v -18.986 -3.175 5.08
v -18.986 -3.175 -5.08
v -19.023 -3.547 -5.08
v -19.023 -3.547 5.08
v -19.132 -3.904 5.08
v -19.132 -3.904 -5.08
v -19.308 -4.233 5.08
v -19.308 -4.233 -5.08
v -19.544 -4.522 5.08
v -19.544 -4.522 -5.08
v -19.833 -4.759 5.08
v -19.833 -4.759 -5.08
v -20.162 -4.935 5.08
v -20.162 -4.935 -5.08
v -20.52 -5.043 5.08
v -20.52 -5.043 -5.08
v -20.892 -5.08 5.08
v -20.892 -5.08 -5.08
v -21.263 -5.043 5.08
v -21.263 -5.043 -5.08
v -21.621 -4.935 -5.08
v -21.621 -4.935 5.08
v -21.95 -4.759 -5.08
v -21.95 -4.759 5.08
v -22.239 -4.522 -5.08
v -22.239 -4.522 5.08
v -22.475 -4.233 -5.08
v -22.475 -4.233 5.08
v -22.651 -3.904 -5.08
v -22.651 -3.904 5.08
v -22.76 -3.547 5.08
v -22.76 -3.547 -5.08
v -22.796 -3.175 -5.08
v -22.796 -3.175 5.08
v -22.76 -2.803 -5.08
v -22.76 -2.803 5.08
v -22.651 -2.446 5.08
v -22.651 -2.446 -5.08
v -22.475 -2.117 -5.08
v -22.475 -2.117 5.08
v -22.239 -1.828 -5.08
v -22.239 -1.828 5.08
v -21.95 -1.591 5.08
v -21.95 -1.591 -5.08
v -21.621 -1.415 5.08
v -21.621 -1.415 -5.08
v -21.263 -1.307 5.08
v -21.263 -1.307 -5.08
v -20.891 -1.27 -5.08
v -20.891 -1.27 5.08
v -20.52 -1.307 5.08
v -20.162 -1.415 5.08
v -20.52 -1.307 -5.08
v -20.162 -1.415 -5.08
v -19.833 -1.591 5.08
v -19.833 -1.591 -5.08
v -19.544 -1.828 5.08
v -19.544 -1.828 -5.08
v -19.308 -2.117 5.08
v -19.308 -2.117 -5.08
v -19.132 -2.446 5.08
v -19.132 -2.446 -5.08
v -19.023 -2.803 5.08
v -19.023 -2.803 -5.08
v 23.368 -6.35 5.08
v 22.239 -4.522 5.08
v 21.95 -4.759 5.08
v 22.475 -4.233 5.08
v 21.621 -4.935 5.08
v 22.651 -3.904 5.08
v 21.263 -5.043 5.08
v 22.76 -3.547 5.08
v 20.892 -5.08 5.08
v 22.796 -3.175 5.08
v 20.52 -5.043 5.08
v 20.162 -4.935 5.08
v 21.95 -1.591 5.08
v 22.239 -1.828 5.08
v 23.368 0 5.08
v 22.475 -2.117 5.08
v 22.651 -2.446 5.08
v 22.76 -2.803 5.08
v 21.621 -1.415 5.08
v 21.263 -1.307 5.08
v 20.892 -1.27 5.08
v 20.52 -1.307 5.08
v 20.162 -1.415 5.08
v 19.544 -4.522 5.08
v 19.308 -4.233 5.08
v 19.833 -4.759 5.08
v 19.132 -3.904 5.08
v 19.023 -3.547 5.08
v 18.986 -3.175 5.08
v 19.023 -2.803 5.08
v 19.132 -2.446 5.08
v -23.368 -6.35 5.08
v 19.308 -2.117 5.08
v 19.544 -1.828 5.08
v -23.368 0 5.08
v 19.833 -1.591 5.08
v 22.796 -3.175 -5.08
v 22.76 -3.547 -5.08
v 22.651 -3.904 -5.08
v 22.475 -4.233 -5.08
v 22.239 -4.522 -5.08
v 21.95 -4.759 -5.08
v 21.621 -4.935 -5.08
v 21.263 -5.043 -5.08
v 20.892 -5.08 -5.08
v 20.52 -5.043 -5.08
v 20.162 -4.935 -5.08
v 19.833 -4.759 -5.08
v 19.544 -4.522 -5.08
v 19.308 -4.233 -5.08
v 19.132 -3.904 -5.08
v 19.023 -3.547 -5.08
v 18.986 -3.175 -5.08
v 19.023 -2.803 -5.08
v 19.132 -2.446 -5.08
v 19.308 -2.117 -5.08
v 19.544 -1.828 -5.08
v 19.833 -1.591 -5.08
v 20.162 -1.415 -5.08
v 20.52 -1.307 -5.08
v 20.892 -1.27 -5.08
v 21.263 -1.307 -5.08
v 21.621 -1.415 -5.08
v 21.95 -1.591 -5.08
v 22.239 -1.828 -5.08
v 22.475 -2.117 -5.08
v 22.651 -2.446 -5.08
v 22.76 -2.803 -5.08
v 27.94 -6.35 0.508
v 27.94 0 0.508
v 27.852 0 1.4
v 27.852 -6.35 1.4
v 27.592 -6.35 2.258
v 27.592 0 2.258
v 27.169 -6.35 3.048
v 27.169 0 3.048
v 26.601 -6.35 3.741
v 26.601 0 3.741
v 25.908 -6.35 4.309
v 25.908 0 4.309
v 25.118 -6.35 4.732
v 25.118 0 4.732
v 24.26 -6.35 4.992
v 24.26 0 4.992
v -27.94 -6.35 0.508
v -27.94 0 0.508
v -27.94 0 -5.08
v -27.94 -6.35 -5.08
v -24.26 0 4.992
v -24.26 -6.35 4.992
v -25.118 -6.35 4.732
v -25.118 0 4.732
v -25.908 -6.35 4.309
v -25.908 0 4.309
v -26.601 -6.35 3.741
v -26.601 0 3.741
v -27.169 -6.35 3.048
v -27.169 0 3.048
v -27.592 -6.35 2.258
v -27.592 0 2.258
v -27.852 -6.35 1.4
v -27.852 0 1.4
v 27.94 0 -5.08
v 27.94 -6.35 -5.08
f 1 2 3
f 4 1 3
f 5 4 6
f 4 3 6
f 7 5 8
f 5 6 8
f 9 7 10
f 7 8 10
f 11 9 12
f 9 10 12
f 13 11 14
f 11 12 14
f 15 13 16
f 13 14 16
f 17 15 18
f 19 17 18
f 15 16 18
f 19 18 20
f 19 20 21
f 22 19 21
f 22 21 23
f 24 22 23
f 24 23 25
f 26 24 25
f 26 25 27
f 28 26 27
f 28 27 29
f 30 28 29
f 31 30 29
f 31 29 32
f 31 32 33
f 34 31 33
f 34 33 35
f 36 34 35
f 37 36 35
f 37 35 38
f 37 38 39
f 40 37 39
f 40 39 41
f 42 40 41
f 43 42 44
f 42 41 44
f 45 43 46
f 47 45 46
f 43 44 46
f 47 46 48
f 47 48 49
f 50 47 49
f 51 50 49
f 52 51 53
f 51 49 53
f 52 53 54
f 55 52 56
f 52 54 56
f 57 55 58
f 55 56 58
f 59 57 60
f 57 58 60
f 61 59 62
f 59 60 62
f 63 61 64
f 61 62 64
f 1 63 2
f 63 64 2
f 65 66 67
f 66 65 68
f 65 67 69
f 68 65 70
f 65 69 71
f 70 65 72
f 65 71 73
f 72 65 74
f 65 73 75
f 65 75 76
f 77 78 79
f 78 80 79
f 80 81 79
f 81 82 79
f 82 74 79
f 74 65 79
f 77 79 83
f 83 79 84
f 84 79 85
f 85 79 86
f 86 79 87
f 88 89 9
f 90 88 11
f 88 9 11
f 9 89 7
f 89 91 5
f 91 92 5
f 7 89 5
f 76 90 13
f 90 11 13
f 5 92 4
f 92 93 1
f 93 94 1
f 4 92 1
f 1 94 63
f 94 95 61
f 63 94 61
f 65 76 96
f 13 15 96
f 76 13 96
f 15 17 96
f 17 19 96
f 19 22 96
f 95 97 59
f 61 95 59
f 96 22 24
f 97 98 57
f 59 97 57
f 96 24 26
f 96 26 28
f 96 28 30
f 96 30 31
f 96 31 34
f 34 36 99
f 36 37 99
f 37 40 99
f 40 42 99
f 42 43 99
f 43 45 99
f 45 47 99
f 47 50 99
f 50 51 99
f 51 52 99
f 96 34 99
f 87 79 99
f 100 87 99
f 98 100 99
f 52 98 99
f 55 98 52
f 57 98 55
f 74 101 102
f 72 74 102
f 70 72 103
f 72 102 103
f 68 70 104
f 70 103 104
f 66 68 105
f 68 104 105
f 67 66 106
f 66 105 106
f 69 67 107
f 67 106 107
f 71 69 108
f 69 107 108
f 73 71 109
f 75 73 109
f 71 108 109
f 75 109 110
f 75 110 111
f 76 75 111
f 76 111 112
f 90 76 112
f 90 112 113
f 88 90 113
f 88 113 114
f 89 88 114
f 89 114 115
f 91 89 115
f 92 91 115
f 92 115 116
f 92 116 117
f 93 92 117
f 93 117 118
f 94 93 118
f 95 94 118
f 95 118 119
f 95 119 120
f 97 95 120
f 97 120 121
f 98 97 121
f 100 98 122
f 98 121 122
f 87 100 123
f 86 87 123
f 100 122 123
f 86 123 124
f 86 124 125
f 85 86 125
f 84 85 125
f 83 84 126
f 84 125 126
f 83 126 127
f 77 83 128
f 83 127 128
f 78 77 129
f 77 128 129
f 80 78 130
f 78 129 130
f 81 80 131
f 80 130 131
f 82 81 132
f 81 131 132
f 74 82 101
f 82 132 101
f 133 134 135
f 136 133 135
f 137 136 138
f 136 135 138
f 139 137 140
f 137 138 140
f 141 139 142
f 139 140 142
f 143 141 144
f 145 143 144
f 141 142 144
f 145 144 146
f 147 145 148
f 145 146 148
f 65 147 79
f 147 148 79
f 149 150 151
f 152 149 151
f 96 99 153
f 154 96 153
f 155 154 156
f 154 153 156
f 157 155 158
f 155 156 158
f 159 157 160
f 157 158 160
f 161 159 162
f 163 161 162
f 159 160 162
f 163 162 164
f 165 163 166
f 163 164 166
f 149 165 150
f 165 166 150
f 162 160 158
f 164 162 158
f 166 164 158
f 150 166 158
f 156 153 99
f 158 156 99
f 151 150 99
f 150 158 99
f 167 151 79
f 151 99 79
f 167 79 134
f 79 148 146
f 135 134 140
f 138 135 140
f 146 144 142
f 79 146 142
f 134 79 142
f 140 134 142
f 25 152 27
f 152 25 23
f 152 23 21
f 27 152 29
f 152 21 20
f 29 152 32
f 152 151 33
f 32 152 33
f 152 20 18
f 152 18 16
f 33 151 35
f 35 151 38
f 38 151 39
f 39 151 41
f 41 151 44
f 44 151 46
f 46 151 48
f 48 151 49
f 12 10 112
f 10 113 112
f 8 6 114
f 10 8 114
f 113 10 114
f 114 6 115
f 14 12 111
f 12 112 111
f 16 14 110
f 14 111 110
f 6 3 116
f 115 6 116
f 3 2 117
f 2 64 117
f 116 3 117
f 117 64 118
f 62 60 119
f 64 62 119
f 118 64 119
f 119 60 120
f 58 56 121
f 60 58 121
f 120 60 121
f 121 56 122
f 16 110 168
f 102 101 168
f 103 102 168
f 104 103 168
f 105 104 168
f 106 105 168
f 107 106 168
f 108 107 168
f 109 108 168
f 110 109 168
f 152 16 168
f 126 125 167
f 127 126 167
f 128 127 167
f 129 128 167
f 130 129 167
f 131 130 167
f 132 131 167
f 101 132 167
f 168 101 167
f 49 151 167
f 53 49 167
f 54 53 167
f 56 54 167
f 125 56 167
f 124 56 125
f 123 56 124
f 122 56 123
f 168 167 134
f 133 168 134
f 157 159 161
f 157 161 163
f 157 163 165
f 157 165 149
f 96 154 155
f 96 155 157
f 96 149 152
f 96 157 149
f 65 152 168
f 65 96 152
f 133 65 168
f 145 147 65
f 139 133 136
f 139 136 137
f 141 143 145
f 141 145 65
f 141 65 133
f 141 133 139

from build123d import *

# Parameters (mm, degrees)
F1_DEPTH = 6.35
F2_R     = 1.905
F3_DEPTH = 25.4


with BuildPart() as f1:
    # F0 (on Front) → F1 (new body)
    with BuildSketch(Plane.XZ):
        with BuildLine():
            ThreePointArc((27.94, 0.508), (26.600892, 3.740892), (23.368, 5.08))
            Line((23.368, 5.08), (-23.368, 5.08))
            ThreePointArc((-23.368, 5.08), (-26.600892, 3.740892), (-27.94, 0.508))
            Line((-27.94, 0.508), (-27.94, -5.08))
            Line((-27.94, -5.08), (27.94, -5.08))
            Line((27.94, -5.08), (27.94, 0.508))
        make_face()
    extrude(amount=F1_DEPTH)

    # F2 (on face) → F3 (cut)
    with BuildSketch(Plane(origin=(0, 0, -5.08), x_dir=(1, 0, 0), z_dir=(0, 0, -1))):
        with Locations((20.8915, 3.175)):
            Circle(F2_R)
        with Locations((-20.8915, 3.175)):
            Circle(F2_R)
    extrude(amount=-F3_DEPTH, mode=Mode.SUBTRACT)


solid = f1.part
